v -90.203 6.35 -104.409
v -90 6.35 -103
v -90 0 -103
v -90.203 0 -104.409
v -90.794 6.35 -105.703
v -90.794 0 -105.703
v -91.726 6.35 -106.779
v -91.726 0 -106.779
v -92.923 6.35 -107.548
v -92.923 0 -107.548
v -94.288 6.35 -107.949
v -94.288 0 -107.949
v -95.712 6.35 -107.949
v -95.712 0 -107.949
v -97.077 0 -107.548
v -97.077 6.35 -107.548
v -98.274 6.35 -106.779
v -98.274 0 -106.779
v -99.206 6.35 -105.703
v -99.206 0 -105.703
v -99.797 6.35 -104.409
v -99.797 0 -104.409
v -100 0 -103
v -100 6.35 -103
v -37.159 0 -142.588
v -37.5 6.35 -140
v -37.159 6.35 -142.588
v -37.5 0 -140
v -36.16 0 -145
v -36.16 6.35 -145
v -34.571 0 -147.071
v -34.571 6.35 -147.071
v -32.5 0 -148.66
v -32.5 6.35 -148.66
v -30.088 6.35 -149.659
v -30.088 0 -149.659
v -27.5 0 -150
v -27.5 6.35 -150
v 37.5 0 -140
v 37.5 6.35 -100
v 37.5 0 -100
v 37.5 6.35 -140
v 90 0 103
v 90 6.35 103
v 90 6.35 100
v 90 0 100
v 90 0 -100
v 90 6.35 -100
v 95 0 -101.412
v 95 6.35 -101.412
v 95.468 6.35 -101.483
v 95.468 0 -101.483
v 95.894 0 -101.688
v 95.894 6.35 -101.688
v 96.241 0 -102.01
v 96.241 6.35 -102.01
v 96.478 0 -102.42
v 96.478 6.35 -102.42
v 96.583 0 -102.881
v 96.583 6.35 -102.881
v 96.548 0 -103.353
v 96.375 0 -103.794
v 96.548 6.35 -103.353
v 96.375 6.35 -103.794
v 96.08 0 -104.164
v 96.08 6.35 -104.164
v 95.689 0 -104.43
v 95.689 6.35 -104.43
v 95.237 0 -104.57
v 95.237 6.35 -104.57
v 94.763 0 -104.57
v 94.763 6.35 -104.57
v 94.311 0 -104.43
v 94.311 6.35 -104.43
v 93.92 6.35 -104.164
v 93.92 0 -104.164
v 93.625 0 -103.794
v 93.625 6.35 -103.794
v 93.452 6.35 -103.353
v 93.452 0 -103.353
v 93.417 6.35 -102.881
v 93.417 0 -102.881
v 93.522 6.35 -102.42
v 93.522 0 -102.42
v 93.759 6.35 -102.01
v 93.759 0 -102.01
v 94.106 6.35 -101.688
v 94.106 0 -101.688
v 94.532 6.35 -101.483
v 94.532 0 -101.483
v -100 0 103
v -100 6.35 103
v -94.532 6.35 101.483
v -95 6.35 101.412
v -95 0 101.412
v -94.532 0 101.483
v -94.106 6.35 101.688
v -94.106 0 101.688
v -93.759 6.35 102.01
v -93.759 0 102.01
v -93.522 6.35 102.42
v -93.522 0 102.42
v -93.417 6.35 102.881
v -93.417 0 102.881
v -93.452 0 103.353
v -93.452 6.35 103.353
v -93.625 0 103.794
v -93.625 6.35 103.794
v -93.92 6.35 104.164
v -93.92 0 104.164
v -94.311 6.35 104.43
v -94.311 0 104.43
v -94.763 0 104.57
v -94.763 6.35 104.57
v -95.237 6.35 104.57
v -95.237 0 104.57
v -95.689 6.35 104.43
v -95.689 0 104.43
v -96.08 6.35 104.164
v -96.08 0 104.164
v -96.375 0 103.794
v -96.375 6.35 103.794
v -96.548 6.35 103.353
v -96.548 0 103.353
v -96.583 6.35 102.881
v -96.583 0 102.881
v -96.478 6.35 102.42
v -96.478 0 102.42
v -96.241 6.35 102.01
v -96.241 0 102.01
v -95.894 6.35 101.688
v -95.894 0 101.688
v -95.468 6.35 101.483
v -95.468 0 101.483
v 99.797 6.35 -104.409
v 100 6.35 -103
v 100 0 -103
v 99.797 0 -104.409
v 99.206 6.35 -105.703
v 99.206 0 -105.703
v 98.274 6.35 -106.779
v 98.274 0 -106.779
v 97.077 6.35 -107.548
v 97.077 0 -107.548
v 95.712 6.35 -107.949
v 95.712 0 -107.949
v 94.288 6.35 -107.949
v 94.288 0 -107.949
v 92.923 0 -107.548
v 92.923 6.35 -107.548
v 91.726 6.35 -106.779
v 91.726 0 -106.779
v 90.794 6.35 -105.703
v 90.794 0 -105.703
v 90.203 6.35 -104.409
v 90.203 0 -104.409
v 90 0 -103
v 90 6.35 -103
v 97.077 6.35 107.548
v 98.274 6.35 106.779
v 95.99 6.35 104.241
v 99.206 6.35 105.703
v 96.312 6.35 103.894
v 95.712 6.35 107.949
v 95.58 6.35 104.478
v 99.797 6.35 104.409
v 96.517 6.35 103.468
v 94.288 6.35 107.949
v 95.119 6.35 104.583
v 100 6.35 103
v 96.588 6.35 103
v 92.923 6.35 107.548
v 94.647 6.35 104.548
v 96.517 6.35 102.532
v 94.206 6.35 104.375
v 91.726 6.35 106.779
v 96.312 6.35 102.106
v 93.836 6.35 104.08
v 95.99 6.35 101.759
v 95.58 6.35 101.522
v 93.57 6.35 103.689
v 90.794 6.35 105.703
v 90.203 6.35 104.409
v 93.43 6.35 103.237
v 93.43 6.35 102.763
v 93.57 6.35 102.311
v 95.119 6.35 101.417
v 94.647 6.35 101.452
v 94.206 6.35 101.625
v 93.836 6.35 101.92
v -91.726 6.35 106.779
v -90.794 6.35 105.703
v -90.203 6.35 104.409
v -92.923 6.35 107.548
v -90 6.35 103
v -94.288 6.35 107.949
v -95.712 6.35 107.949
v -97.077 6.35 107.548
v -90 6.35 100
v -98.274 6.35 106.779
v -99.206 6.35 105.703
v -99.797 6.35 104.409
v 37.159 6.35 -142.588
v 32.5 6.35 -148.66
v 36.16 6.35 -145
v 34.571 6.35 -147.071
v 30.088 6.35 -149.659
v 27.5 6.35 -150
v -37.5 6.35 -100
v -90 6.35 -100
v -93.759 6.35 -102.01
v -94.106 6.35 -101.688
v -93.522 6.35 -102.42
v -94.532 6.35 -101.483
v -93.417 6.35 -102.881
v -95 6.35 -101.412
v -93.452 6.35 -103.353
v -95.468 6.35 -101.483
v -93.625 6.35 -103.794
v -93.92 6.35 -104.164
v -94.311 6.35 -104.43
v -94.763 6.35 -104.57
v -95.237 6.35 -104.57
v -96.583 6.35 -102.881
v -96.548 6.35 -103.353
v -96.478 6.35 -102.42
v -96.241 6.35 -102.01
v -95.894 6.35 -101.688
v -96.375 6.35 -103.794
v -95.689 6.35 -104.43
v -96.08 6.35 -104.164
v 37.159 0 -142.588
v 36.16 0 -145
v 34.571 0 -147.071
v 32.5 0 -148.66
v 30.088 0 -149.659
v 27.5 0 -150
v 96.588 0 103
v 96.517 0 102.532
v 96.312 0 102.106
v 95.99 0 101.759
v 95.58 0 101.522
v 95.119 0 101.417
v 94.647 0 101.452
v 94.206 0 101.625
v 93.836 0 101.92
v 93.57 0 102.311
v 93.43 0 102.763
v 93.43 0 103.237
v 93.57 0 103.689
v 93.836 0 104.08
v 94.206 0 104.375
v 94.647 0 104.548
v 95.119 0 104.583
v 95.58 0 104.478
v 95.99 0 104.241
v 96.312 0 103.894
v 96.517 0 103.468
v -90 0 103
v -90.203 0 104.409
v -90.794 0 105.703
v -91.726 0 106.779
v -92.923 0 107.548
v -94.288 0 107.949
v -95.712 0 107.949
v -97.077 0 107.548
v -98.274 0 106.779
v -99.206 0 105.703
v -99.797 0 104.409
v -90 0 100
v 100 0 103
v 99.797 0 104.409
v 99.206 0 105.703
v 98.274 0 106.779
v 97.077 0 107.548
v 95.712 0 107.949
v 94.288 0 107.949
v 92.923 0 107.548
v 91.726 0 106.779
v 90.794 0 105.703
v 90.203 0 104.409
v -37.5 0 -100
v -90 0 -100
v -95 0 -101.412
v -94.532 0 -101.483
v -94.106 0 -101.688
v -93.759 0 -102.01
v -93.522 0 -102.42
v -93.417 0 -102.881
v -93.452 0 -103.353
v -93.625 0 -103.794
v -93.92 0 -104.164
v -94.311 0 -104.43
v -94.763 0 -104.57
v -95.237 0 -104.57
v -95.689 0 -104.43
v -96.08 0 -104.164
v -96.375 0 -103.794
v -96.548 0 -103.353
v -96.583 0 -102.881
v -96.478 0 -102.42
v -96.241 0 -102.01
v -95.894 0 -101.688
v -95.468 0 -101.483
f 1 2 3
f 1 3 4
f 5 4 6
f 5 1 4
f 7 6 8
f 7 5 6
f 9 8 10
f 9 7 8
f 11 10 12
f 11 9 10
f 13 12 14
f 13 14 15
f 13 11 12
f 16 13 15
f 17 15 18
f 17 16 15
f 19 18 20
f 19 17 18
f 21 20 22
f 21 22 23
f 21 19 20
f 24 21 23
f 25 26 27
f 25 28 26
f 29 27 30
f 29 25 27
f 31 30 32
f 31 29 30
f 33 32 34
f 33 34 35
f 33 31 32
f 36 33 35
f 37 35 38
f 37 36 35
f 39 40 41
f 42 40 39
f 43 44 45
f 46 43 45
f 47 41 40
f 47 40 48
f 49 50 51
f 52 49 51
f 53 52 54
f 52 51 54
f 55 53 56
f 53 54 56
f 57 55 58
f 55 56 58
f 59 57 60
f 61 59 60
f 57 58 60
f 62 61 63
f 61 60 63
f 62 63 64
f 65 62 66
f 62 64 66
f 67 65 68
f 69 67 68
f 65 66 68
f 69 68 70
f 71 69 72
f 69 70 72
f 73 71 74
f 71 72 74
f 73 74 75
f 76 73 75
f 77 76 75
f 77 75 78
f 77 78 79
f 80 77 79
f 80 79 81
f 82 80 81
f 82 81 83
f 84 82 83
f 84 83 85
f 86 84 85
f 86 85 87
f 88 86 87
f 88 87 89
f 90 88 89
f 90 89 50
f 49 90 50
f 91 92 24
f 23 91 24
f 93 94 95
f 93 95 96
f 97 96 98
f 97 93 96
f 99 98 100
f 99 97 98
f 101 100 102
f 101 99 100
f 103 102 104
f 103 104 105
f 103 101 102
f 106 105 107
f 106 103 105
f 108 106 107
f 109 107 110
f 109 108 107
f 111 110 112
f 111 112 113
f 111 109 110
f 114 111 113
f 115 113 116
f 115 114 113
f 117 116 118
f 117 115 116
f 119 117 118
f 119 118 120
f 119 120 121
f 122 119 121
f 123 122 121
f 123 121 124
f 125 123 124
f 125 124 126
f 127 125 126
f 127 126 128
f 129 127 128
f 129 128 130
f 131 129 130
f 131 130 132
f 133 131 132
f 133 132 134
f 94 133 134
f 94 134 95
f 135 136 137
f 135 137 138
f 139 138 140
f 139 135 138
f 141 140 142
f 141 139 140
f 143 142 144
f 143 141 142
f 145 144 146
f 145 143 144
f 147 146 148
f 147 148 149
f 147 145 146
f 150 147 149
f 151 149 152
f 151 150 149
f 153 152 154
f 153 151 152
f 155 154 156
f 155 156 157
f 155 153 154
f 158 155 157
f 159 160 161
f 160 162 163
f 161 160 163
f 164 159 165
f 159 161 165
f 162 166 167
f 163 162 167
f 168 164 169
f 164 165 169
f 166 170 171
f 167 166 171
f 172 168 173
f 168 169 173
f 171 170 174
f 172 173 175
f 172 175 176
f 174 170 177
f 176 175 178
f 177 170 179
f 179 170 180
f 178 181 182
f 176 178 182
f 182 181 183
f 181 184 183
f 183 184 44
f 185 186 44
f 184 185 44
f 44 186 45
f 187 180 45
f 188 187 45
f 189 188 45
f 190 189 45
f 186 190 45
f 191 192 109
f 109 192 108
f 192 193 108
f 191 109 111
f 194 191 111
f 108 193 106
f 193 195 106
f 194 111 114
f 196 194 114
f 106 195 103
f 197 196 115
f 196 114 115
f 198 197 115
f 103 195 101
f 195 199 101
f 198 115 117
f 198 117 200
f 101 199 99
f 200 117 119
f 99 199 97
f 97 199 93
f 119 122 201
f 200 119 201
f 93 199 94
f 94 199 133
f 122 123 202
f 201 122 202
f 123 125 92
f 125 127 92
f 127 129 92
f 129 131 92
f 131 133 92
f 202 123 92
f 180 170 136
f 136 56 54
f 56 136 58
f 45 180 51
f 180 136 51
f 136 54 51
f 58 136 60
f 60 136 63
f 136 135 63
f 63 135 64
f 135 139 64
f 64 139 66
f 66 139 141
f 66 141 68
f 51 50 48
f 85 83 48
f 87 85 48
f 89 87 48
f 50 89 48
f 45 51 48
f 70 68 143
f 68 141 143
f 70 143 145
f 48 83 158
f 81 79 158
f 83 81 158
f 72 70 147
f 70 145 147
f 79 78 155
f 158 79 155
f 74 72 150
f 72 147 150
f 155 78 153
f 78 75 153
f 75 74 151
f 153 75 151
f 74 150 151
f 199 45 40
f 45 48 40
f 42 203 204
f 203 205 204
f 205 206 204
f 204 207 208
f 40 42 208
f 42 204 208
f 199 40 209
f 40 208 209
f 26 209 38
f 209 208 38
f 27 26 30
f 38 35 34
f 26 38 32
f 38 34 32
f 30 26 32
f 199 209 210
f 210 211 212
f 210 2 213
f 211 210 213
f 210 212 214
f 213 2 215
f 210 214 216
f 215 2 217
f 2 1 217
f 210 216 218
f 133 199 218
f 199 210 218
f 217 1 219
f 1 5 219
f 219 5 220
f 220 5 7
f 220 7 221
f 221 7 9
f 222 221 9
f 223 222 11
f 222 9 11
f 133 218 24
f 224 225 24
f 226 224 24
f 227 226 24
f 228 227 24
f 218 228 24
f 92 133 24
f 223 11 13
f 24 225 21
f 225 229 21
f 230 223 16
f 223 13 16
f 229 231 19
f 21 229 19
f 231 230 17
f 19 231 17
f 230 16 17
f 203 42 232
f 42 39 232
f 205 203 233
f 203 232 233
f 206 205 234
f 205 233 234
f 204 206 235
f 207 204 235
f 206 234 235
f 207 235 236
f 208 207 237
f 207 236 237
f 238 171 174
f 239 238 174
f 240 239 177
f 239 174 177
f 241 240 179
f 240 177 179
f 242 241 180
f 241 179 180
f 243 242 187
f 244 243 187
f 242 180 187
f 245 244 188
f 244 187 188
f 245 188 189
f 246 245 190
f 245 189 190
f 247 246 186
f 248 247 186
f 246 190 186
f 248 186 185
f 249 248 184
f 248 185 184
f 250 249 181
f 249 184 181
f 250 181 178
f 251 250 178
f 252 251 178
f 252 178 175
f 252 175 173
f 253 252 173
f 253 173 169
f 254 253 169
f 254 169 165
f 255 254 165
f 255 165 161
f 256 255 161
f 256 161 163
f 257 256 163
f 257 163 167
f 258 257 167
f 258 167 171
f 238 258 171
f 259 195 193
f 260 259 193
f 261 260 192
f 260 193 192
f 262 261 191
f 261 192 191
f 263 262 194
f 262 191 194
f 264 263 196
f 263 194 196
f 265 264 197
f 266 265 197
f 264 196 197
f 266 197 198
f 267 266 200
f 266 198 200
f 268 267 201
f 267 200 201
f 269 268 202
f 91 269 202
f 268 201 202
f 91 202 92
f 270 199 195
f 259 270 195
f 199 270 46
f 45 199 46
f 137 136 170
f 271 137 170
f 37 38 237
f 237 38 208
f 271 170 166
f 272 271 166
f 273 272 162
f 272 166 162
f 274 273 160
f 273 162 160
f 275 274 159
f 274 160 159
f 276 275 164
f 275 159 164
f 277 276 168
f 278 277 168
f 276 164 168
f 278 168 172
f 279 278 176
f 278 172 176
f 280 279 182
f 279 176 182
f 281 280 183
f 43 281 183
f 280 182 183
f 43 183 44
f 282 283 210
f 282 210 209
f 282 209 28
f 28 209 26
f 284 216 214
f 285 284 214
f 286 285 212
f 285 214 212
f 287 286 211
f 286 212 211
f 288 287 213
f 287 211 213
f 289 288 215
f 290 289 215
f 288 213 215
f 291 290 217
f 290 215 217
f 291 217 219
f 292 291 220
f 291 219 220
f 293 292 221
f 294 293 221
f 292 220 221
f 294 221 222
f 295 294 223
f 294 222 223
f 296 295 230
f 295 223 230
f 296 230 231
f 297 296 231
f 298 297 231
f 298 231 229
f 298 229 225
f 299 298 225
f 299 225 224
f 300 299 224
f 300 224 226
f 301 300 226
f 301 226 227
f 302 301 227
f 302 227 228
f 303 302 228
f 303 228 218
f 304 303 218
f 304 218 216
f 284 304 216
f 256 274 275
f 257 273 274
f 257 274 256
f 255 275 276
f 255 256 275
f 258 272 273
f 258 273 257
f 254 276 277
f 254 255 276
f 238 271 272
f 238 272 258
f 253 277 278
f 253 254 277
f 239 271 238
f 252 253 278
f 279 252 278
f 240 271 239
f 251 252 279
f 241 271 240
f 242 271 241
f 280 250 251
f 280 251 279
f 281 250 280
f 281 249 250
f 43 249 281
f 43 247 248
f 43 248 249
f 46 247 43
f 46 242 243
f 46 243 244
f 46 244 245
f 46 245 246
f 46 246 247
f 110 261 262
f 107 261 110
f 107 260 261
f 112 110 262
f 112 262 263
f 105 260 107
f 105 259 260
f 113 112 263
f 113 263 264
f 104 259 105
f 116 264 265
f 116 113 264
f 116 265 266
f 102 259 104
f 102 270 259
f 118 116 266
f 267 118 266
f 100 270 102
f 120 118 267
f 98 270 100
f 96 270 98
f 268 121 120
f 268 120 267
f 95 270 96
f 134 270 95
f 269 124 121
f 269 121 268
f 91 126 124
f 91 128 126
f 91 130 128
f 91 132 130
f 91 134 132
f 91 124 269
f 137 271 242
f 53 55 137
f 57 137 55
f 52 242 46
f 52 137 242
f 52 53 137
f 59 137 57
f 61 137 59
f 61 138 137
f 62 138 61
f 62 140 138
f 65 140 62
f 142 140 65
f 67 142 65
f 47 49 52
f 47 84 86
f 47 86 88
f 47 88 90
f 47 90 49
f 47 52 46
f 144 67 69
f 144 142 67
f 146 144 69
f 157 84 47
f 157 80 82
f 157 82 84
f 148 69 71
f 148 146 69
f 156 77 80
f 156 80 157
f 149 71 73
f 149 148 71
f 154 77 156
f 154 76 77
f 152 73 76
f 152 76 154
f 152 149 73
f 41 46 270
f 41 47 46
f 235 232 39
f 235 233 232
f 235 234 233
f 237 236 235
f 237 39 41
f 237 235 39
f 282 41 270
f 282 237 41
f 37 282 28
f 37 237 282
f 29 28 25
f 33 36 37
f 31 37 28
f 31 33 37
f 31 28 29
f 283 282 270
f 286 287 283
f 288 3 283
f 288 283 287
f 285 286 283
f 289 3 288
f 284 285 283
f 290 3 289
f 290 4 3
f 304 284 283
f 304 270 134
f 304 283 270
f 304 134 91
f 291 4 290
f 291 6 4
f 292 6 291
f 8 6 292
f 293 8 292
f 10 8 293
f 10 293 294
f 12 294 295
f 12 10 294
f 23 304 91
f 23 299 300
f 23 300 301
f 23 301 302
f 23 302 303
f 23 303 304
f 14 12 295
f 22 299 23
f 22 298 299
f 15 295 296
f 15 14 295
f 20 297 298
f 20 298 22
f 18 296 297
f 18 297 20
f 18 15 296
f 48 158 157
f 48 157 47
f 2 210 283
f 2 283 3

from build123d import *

# Parameters (mm, degrees)
ESQUISSE1_W                = 200
ESQUISSE1_H                = 200
BOSS_EXTRU_1_DEPTH         = 6.35
BOSS_EXTRU_2_DEPTH         = 6.35
ENL_V_MAT_EXTRU_1_REACH    = 149.324
ESQUISSE3_R                = 1.5875
R_P_TITION_LIN_AIRE1_COUNT = 2
R_P_TITION_LIN_AIRE1_PITCH = 190
SYM_TRIE1_COPY_1_DEPTH     = 6.35
SYM_TRIE1_COPY_2_REACH     = 149.324
SYM_TRIE1_COPY_2_SKETCH_R  = 1.5875
ESQUISSE4_W                = 75
ESQUISSE4_H                = 50
BOSS_EXTRU_3_DEPTH         = 6.35
CONG_1_R                   = 10


with BuildPart() as part:
    # Esquisse1 → Boss.-Extru.1 (new body)
    with BuildSketch(Plane(origin=(0, 0, 0), x_dir=(1, 0, 0), z_dir=(0, 1, 0))):
        Rectangle(ESQUISSE1_W, ESQUISSE1_H)
    extrude(amount=BOSS_EXTRU_1_DEPTH)

    # Esquisse2 → Boss.-Extru.2 (add)
    with BuildSketch(Plane(origin=(0, 6.35, 0), x_dir=(1, 0, 0), z_dir=(0, 1, 0))):
        with BuildLine():
            Line((-100, 100), (-90, 100))
            Line((-90, 100), (-90, 103))
            ThreePointArc((-90, 103), (-95, 108), (-100, 103))
            Line((-100, 103), (-100, 100))
        make_face()
    boss_extru_2 = extrude(amount=-BOSS_EXTRU_2_DEPTH)

    # Esquisse3 → Enlèv. mat.-Extru.1 (cut, up to next)
    with BuildSketch(Plane(origin=(0, 6.35, 0), x_dir=(1, 0, 0), z_dir=(0, 1, 0)), mode=Mode.PRIVATE) as enl_v_mat_extru_1_sk1:
        with Locations(Location((-95, 103, 0), (0, 0, 270))):
            Circle(ESQUISSE3_R)
    enl_v_mat_extru_1_tool1 = extrude(enl_v_mat_extru_1_sk1.sketch, amount=-ENL_V_MAT_EXTRU_1_REACH, mode=Mode.PRIVATE) & part.part
    enl_v_mat_extru_1 = enl_v_mat_extru_1_tool1.solids().sort_by_distance((-95, 6.35, -103))[0]
    add(enl_v_mat_extru_1, mode=Mode.SUBTRACT)

    # Répétition linéaire1: Boss.-Extru.2, Enlèv. mat.-Extru.1 ×2
    with Locations(*[(i * R_P_TITION_LIN_AIRE1_PITCH, 0, 0) for i in range(1, R_P_TITION_LIN_AIRE1_COUNT)]):
        add(boss_extru_2)
        add(enl_v_mat_extru_1, mode=Mode.SUBTRACT)

    # Symétrie1: Boss.-Extru.2, Enlèv. mat.-Extru.1 across plane
    add(boss_extru_2.mirror(Plane.XY))
    add(enl_v_mat_extru_1.mirror(Plane.XY), mode=Mode.SUBTRACT)

    # Symétrie1 copy 1 sketch → Symétrie1 copy 1 (add)
    with BuildSketch(Plane(origin=(190, 6.35, 0), x_dir=(1, 0, 0), z_dir=(0, 1, 0))):
        with BuildLine():
            Line((-100, -100), (-90, -100))
            Line((-90, -100), (-90, -103))
            ThreePointArc((-90, -103), (-95, -108), (-100, -103))
            Line((-100, -103), (-100, -100))
        make_face()
    extrude(amount=-SYM_TRIE1_COPY_1_DEPTH)

    # Symétrie1 copy 2 sketch → Symétrie1 copy 2 (cut, up to next)
    with BuildSketch(Plane(origin=(190, 6.35, 0), x_dir=(1, 0, 0), z_dir=(0, 1, 0)), mode=Mode.PRIVATE) as sym_trie1_copy_2_sk1:
        with Locations((-95, -103)):
            Circle(SYM_TRIE1_COPY_2_SKETCH_R)
    sym_trie1_copy_2_tool1 = extrude(sym_trie1_copy_2_sk1.sketch, amount=-SYM_TRIE1_COPY_2_REACH, mode=Mode.PRIVATE) & part.part
    add(sym_trie1_copy_2_tool1.solids().sort_by_distance((95, 6.35, 103))[0], mode=Mode.SUBTRACT)

    # Esquisse4 → Boss.-Extru.3 (add)
    with BuildSketch(Plane(origin=(0, 6.35, 0), x_dir=(1, 0, 0), z_dir=(0, 1, 0))):
        with Locations((0, 125)):
            Rectangle(ESQUISSE4_W, ESQUISSE4_H)
    extrude(amount=-BOSS_EXTRU_3_DEPTH)

    # Congé1
    cong_1_edges = [part.edges().sort_by_distance(p)[0] for p in [
        (-37.5, 3.175, -150),
        (37.5, 3.175, -150),
    ]]
    fillet(cong_1_edges, radius=CONG_1_R)


solid = part.part
